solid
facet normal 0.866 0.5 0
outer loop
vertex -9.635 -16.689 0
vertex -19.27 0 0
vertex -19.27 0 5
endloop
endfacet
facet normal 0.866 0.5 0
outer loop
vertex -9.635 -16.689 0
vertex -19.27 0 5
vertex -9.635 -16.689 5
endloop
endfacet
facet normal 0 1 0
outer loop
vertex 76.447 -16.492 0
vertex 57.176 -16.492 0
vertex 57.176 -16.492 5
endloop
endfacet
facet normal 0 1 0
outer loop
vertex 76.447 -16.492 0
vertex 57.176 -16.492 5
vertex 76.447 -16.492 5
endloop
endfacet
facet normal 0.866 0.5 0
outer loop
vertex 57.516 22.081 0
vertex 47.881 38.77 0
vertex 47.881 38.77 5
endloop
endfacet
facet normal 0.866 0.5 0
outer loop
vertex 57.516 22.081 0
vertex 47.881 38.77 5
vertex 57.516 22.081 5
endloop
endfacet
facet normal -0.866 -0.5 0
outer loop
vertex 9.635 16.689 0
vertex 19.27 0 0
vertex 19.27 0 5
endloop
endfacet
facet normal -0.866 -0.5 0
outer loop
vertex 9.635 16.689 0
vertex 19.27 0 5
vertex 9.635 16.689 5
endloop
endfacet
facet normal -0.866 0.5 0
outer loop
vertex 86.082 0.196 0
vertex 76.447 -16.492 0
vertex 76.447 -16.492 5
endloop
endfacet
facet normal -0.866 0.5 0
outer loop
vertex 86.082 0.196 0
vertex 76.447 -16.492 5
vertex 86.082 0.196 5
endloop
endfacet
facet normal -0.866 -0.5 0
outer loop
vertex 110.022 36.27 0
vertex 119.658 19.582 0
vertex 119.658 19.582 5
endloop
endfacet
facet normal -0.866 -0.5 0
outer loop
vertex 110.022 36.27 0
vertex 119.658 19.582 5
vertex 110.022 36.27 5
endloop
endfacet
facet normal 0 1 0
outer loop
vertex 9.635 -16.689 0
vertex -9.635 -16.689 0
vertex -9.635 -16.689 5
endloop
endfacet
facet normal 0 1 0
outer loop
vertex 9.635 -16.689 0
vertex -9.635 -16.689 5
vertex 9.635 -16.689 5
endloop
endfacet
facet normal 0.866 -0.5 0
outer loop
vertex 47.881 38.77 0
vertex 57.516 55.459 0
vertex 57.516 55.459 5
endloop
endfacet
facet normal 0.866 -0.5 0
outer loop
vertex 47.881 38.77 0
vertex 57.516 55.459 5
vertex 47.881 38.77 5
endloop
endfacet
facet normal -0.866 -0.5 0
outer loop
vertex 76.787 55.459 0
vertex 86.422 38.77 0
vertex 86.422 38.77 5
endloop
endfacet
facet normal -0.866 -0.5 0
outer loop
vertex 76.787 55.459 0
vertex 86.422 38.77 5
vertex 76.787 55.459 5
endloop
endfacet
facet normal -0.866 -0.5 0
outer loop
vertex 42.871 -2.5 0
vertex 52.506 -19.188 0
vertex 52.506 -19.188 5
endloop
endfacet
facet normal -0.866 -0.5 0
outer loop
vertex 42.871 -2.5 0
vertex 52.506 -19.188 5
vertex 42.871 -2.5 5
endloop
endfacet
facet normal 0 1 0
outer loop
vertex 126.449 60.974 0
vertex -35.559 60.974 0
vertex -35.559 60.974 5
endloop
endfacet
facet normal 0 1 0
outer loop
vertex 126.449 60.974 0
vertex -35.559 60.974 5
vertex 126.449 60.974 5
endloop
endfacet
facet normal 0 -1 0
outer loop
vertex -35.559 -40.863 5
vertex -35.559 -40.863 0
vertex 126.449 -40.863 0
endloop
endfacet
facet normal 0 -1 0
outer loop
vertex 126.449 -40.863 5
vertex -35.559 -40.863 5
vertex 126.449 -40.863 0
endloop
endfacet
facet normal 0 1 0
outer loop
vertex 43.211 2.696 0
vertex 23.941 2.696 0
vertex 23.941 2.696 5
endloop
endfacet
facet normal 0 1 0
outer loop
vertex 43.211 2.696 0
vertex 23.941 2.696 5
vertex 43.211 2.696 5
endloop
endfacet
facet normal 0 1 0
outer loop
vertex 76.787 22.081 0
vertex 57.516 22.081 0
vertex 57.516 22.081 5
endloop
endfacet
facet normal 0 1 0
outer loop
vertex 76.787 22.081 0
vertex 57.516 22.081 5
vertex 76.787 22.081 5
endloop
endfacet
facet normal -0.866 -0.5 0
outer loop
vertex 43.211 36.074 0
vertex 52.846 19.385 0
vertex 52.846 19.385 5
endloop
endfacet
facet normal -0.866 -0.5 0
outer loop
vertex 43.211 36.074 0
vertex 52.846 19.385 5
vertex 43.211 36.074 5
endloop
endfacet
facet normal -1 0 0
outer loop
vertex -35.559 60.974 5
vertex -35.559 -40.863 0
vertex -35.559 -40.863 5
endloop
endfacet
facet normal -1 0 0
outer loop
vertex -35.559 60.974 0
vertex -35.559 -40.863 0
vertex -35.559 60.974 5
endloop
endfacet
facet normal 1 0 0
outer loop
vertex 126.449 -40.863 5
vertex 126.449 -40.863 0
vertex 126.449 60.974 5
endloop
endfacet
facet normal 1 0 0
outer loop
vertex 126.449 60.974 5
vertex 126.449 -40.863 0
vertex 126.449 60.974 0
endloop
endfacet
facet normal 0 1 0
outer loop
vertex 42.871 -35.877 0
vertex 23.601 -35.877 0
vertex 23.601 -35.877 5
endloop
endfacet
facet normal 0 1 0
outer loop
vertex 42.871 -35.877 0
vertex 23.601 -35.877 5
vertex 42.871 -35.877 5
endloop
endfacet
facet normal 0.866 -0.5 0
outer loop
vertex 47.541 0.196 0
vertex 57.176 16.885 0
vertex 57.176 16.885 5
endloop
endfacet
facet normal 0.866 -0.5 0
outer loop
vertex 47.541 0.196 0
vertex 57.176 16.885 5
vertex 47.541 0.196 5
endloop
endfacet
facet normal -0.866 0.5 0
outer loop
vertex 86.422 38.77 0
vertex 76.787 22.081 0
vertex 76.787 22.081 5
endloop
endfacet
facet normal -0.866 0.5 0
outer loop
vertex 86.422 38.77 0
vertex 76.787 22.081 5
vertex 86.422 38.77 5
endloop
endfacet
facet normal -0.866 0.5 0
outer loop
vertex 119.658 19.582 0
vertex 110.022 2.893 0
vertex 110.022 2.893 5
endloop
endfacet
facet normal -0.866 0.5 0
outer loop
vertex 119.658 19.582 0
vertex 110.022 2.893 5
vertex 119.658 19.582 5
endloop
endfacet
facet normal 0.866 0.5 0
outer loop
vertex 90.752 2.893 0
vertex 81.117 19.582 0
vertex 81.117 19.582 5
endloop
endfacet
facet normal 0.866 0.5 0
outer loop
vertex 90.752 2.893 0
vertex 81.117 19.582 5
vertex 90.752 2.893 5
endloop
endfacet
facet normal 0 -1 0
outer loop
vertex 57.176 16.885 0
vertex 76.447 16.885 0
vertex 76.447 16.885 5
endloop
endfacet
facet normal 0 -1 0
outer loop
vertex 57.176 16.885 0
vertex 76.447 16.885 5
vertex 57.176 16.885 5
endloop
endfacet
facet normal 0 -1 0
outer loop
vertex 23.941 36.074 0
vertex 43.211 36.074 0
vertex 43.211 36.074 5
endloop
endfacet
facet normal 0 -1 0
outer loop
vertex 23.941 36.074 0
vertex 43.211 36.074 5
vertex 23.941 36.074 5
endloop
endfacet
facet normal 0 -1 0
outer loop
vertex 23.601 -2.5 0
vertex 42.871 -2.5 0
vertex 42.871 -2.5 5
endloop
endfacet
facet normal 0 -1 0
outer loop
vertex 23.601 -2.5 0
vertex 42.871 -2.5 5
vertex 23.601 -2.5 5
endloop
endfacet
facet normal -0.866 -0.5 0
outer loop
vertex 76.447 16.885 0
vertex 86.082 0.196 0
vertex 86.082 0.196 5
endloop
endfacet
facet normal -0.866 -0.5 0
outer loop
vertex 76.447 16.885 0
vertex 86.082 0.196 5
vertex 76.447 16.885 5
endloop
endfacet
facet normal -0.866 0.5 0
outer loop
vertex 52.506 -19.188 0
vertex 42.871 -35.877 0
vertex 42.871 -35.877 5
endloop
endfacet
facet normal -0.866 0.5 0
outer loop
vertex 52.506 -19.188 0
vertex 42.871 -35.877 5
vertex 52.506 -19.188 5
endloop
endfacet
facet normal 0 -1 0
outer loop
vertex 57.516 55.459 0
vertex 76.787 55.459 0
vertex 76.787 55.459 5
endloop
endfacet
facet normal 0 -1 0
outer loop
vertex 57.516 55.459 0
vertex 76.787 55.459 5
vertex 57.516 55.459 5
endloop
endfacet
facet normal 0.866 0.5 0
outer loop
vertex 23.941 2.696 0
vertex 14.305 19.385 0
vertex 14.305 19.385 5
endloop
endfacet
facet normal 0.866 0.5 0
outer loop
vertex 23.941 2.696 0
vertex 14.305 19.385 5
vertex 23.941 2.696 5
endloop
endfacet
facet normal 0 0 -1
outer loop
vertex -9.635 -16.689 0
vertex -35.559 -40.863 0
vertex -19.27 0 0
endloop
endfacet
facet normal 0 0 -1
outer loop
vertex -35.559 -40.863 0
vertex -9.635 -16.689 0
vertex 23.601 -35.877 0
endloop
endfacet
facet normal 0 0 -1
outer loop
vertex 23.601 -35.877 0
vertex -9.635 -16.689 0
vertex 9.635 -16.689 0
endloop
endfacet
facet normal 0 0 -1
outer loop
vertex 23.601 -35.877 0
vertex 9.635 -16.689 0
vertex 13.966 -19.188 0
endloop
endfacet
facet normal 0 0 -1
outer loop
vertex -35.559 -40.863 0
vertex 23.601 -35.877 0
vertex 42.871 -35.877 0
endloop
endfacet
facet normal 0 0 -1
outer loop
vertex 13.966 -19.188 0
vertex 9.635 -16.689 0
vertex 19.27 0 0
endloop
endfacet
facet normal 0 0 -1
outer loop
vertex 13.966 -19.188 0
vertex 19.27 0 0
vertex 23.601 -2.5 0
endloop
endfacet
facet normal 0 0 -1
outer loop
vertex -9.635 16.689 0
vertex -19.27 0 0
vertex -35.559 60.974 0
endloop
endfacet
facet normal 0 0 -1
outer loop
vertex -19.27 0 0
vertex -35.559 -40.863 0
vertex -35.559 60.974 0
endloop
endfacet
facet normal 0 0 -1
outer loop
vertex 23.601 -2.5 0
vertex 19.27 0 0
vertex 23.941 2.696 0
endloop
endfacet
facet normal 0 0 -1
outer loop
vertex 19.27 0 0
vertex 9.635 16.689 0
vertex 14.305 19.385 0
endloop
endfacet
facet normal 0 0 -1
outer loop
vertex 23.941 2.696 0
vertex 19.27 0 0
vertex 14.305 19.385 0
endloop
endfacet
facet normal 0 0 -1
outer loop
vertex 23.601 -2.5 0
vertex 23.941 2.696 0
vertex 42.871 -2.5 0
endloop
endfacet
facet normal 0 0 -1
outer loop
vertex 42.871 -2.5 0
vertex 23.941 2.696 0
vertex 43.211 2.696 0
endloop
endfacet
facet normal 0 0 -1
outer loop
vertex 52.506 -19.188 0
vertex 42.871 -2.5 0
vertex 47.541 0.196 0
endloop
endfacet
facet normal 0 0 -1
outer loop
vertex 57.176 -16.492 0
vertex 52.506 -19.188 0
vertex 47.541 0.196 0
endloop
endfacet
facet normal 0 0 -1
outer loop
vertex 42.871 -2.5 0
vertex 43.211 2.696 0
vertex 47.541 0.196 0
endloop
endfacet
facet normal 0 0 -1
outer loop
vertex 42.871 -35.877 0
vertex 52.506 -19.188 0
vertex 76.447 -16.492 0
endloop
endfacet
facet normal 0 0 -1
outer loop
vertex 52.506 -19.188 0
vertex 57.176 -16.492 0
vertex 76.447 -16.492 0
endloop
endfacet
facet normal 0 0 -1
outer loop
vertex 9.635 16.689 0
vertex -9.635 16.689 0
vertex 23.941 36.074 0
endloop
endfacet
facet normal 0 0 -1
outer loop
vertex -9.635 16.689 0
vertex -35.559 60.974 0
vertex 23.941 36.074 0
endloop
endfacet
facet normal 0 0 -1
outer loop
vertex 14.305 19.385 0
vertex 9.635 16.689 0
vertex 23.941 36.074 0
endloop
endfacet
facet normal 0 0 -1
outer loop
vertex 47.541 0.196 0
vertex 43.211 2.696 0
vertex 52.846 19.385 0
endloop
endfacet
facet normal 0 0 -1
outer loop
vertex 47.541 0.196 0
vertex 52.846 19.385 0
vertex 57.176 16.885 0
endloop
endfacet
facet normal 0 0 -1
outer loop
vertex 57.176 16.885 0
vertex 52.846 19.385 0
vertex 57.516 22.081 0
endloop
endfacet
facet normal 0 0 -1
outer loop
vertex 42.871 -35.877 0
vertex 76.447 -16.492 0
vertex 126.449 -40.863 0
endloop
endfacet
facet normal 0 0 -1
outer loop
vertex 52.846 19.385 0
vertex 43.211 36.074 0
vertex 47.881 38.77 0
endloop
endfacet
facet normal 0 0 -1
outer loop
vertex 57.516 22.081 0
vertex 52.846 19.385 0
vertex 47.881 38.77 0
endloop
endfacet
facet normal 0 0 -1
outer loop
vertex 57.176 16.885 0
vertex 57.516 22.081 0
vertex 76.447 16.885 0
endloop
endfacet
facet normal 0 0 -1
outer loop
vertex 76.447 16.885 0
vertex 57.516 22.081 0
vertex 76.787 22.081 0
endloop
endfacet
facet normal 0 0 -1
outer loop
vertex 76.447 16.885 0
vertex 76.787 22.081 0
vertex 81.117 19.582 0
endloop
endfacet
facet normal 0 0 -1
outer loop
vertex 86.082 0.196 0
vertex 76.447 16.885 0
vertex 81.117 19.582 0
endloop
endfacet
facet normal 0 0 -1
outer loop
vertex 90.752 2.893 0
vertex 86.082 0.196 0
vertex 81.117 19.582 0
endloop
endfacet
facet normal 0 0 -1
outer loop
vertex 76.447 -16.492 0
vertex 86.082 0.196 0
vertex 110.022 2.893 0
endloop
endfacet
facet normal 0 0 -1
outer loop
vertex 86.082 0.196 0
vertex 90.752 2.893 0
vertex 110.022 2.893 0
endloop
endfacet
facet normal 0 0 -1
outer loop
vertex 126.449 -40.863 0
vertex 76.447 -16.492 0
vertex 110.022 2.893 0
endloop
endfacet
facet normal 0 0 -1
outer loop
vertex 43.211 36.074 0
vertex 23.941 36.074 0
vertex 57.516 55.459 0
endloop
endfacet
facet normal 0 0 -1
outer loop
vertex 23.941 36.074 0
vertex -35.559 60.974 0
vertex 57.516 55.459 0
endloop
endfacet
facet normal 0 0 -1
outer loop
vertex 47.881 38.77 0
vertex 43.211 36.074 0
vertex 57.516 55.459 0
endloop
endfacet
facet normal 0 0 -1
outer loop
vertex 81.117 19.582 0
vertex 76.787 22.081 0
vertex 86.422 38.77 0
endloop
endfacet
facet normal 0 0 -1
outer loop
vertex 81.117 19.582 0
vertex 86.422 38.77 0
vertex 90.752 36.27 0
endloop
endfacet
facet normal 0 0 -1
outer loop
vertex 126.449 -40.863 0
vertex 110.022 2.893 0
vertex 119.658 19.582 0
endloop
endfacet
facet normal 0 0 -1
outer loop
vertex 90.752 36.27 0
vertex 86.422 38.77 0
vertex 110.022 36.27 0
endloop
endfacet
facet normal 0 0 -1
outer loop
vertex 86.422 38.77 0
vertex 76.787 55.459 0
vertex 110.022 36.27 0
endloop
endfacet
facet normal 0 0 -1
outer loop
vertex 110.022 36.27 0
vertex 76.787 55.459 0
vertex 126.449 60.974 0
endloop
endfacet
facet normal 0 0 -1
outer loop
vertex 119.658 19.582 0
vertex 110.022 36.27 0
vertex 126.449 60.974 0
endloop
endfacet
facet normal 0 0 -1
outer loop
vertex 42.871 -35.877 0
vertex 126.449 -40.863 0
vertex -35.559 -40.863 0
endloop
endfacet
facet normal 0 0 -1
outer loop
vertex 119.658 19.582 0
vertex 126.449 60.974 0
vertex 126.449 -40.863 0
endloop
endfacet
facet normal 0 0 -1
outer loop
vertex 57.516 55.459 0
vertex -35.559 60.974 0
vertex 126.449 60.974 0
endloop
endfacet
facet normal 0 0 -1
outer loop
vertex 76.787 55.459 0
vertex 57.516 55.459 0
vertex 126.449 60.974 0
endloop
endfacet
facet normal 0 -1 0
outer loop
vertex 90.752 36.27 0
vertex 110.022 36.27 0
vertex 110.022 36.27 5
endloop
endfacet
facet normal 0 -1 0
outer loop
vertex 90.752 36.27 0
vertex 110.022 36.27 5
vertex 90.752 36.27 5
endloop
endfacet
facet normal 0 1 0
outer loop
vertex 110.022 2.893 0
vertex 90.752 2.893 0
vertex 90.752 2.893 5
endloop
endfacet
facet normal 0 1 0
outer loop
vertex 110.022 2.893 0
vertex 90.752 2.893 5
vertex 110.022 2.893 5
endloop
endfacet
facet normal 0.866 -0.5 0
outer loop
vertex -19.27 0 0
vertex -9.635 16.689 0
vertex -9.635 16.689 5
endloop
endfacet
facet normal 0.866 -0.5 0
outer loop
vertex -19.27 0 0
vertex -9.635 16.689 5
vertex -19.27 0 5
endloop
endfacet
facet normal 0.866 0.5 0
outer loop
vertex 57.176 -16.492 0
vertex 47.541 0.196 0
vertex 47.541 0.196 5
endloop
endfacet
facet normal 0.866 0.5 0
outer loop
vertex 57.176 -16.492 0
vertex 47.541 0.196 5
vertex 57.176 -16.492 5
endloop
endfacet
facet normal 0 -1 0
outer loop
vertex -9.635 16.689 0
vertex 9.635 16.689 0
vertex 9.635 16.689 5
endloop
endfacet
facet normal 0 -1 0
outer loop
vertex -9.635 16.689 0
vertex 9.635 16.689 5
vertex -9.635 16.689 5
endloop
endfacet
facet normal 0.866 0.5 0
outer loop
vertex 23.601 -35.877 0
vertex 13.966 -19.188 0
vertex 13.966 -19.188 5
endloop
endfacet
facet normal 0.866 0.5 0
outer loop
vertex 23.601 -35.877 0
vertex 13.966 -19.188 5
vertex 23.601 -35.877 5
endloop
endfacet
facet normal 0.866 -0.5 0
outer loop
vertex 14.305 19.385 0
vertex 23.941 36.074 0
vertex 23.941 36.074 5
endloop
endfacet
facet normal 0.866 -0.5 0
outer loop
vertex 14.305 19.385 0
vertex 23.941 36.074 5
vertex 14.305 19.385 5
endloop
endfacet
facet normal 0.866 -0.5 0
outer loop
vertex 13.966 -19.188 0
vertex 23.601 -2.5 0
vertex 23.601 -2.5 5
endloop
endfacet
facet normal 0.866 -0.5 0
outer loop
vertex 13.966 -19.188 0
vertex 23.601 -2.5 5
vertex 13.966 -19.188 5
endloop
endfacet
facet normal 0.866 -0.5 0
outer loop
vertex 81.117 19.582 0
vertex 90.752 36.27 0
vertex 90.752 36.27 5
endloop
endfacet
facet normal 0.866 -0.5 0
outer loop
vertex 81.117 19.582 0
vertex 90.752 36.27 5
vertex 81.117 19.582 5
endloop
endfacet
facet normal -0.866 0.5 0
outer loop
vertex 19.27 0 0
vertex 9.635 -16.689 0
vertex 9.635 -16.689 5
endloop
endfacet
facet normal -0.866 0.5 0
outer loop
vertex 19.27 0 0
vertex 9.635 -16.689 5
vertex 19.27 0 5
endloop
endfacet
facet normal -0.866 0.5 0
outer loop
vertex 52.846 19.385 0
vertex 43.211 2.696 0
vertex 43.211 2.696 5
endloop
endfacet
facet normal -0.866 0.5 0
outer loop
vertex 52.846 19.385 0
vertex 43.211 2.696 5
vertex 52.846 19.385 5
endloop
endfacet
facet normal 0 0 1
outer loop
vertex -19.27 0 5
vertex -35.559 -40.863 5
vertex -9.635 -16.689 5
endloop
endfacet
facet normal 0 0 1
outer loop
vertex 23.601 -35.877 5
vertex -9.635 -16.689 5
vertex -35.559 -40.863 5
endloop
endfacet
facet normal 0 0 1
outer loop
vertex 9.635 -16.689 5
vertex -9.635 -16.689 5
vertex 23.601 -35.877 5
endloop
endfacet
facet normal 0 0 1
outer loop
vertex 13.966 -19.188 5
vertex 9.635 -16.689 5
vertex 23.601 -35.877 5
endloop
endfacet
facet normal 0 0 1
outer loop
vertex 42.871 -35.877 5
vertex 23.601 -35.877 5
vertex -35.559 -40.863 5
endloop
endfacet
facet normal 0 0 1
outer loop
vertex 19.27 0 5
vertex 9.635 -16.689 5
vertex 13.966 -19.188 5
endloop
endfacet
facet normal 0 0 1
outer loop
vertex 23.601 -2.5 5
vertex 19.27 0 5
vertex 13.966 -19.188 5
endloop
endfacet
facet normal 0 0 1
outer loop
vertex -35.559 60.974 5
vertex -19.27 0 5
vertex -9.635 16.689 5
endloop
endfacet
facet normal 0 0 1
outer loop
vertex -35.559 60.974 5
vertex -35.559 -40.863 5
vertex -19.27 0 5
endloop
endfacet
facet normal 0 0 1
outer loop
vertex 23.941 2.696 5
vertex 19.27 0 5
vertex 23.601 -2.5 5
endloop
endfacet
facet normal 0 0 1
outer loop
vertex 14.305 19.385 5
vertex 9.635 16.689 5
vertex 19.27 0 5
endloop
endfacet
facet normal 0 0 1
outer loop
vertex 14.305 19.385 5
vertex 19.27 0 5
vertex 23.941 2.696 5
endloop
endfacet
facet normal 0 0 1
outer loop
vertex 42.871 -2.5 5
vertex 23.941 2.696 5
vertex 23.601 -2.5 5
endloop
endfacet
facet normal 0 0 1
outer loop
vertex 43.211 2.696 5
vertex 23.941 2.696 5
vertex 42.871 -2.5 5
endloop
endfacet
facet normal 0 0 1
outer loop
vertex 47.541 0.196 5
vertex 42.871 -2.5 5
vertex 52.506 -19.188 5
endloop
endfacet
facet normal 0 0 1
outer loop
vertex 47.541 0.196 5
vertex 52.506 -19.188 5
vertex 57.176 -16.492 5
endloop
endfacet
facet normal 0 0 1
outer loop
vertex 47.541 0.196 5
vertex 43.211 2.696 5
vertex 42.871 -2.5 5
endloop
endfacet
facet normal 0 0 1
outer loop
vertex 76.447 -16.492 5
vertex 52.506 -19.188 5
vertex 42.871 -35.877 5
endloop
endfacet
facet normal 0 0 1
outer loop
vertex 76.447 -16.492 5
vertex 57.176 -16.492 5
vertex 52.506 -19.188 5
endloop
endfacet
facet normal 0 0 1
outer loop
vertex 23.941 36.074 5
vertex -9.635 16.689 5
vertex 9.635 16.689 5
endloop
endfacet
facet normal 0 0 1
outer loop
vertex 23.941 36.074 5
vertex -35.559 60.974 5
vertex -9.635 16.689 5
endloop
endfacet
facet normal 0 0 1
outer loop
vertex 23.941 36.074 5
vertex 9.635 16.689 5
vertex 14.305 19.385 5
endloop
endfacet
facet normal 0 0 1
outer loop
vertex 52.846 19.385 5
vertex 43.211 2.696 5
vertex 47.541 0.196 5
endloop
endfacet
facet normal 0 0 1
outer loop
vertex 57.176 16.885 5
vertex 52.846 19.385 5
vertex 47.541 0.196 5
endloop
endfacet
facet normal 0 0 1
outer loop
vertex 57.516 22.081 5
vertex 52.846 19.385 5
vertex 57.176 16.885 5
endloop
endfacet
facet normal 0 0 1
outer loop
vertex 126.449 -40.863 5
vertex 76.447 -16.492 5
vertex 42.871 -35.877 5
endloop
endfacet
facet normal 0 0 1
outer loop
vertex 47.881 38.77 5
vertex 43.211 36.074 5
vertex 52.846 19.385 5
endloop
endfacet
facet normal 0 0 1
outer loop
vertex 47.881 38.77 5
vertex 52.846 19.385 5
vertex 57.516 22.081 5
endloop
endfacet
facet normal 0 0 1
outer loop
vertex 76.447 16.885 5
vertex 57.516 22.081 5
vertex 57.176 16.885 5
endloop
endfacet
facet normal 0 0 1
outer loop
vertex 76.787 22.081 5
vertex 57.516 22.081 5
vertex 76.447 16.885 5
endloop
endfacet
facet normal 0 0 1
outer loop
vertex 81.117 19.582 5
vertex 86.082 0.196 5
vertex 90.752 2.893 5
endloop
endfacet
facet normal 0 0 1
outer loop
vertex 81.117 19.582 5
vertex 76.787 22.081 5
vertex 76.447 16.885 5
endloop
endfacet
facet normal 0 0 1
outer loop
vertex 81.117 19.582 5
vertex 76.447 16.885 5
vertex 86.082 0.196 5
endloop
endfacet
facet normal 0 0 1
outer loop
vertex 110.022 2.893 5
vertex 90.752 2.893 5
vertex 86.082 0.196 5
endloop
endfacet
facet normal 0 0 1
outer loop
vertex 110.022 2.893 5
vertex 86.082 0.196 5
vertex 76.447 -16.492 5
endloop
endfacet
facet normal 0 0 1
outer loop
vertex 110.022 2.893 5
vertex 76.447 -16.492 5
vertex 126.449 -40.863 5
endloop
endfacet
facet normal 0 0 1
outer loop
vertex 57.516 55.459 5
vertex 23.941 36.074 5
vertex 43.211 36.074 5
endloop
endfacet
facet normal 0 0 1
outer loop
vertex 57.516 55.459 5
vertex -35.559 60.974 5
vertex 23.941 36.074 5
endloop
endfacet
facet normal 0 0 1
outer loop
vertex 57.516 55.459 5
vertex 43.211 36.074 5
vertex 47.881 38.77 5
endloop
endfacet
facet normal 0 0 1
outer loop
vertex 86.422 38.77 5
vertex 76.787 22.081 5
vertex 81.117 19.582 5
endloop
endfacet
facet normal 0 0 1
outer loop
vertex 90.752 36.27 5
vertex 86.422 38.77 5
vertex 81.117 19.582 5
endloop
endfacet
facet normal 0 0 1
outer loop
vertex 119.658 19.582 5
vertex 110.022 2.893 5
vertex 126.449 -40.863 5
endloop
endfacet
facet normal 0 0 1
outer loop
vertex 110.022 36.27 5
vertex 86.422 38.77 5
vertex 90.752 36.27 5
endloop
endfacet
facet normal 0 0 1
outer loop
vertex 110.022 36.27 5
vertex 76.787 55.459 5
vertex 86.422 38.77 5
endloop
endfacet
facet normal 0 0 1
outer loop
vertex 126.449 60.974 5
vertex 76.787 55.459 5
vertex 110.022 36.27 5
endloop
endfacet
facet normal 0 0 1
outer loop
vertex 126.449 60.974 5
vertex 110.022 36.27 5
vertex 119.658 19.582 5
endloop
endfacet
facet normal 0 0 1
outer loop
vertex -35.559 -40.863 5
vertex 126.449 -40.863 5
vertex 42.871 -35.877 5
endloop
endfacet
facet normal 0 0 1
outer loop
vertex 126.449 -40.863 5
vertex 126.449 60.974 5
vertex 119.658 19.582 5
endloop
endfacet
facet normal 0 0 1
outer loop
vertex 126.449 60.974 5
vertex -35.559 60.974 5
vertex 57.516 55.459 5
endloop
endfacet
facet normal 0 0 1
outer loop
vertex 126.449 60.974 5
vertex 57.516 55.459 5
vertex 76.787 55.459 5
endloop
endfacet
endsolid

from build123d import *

# Parameters (mm, degrees)
F1_W     = 162.00855
F1_H     = 101.837539
F2_DEPTH = 5
F3_DEPTH = 5.001


with BuildPart() as f2:
    # F1 (on Top) → F2 (new body)
    with BuildSketch(Plane.XY):
        with Locations((45.444982, 10.055467)):
            Rectangle(F1_W, F1_H)
    extrude(amount=F2_DEPTH)

    # F0 (on Top) → F3 (cut, through all)
    with BuildSketch(Plane.XY):
        Polygon((-9.63525, -16.688743), (9.63525, -16.688743), (19.2705, 0), (9.63525, 16.688743), (-9.63525, 16.688743), (-19.2705, 0), align=None)
        Polygon((42.870847, -2.5), (23.600627, -2.5), (13.965517, -19.1885), (23.600627, -35.877), (42.870847, -35.877), (52.505957, -19.1885), align=None)
        Polygon((14.305305, 19.385), (23.940555, 2.696257), (43.211055, 2.696257), (52.846305, 19.385), (43.211055, 36.073743), (23.940555, 36.073743), align=None)
        Polygon((57.176432, -16.492), (76.446652, -16.492), (86.081762, 0.1965), (76.446652, 16.885), (57.176432, 16.885), (47.541322, 0.1965), align=None)
        Polygon((47.88111, 38.77), (57.51636, 22.081257), (76.78686, 22.081257), (86.42211, 38.77), (76.78686, 55.458743), (57.51636, 55.458743), align=None)
        Polygon((90.752237, 2.893), (110.022457, 2.893), (119.657567, 19.5815), (110.022457, 36.27), (90.752237, 36.27), (81.117127, 19.5815), align=None)
    extrude(amount=F3_DEPTH, mode=Mode.SUBTRACT)


solid = f2.part
